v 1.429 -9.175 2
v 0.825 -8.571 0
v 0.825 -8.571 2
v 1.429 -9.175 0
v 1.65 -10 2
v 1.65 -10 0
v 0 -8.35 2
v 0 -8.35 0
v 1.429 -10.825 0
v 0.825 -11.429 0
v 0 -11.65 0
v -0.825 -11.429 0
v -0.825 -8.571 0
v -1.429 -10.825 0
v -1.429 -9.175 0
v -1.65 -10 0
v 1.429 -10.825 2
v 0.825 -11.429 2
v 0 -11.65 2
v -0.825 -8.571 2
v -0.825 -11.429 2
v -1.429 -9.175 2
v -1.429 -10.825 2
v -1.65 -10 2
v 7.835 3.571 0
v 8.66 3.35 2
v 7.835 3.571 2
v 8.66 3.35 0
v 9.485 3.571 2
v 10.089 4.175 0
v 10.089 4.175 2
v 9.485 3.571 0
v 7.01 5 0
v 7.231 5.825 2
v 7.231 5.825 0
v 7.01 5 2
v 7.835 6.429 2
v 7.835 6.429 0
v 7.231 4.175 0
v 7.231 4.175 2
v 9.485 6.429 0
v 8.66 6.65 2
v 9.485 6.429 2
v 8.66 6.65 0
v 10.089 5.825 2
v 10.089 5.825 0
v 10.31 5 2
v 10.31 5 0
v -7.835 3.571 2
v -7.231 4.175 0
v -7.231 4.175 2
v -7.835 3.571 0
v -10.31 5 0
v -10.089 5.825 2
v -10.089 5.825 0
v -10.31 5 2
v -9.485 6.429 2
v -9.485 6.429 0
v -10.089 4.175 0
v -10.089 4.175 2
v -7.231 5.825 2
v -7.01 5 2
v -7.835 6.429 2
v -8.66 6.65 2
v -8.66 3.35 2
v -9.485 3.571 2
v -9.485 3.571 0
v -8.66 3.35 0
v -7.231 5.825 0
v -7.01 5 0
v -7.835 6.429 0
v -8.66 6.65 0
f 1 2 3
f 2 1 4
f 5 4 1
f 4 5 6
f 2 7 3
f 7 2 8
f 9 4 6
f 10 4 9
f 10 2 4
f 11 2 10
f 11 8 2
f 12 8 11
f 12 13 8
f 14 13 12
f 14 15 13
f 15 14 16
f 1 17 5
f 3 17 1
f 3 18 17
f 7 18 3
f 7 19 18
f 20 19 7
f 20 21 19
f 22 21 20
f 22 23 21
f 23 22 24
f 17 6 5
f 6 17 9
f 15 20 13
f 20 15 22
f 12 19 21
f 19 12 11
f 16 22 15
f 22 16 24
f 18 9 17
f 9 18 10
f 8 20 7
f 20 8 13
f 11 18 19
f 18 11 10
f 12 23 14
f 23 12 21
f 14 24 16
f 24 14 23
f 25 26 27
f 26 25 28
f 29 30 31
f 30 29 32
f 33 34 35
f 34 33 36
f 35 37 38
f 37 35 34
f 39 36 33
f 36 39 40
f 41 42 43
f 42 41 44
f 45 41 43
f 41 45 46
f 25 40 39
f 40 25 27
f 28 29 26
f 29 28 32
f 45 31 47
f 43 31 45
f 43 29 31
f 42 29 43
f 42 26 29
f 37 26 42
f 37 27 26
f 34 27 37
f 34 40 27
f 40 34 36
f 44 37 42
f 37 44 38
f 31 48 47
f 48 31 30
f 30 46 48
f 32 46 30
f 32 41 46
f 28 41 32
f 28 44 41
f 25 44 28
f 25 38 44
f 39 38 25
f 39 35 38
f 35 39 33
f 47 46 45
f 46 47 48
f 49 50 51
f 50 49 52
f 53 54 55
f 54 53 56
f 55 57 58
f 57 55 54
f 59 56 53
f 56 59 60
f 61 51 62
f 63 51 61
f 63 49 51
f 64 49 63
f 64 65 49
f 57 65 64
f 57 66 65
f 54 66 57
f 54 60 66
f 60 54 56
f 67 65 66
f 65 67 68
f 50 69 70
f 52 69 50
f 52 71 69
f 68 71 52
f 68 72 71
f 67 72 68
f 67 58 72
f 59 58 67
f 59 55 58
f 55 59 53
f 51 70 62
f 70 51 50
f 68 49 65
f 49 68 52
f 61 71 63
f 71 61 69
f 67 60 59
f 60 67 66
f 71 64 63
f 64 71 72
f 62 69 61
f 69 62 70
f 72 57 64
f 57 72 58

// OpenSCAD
//MAGNET HOLES
// current project uses magnets of diameter 3, height 2mm

module magnet_holes(radius){
    translate([0,0,1])union(){ //d=3.3 for tolerance
    translate([0,-1*radius,0])cylinder(d=3.3,h=2,center=true, $fn=12);
    rotate([0,0,120])translate([0,-1*radius,0])cylinder(d=3.3,h=2,center=true, $fn=12);
    rotate([0,0,-120])translate([0,-1*radius,0])cylinder(d=3.3,h=2,center=true, $fn=12);
    } // end union
} //end module

magnet_holes(10); // just an illustration
